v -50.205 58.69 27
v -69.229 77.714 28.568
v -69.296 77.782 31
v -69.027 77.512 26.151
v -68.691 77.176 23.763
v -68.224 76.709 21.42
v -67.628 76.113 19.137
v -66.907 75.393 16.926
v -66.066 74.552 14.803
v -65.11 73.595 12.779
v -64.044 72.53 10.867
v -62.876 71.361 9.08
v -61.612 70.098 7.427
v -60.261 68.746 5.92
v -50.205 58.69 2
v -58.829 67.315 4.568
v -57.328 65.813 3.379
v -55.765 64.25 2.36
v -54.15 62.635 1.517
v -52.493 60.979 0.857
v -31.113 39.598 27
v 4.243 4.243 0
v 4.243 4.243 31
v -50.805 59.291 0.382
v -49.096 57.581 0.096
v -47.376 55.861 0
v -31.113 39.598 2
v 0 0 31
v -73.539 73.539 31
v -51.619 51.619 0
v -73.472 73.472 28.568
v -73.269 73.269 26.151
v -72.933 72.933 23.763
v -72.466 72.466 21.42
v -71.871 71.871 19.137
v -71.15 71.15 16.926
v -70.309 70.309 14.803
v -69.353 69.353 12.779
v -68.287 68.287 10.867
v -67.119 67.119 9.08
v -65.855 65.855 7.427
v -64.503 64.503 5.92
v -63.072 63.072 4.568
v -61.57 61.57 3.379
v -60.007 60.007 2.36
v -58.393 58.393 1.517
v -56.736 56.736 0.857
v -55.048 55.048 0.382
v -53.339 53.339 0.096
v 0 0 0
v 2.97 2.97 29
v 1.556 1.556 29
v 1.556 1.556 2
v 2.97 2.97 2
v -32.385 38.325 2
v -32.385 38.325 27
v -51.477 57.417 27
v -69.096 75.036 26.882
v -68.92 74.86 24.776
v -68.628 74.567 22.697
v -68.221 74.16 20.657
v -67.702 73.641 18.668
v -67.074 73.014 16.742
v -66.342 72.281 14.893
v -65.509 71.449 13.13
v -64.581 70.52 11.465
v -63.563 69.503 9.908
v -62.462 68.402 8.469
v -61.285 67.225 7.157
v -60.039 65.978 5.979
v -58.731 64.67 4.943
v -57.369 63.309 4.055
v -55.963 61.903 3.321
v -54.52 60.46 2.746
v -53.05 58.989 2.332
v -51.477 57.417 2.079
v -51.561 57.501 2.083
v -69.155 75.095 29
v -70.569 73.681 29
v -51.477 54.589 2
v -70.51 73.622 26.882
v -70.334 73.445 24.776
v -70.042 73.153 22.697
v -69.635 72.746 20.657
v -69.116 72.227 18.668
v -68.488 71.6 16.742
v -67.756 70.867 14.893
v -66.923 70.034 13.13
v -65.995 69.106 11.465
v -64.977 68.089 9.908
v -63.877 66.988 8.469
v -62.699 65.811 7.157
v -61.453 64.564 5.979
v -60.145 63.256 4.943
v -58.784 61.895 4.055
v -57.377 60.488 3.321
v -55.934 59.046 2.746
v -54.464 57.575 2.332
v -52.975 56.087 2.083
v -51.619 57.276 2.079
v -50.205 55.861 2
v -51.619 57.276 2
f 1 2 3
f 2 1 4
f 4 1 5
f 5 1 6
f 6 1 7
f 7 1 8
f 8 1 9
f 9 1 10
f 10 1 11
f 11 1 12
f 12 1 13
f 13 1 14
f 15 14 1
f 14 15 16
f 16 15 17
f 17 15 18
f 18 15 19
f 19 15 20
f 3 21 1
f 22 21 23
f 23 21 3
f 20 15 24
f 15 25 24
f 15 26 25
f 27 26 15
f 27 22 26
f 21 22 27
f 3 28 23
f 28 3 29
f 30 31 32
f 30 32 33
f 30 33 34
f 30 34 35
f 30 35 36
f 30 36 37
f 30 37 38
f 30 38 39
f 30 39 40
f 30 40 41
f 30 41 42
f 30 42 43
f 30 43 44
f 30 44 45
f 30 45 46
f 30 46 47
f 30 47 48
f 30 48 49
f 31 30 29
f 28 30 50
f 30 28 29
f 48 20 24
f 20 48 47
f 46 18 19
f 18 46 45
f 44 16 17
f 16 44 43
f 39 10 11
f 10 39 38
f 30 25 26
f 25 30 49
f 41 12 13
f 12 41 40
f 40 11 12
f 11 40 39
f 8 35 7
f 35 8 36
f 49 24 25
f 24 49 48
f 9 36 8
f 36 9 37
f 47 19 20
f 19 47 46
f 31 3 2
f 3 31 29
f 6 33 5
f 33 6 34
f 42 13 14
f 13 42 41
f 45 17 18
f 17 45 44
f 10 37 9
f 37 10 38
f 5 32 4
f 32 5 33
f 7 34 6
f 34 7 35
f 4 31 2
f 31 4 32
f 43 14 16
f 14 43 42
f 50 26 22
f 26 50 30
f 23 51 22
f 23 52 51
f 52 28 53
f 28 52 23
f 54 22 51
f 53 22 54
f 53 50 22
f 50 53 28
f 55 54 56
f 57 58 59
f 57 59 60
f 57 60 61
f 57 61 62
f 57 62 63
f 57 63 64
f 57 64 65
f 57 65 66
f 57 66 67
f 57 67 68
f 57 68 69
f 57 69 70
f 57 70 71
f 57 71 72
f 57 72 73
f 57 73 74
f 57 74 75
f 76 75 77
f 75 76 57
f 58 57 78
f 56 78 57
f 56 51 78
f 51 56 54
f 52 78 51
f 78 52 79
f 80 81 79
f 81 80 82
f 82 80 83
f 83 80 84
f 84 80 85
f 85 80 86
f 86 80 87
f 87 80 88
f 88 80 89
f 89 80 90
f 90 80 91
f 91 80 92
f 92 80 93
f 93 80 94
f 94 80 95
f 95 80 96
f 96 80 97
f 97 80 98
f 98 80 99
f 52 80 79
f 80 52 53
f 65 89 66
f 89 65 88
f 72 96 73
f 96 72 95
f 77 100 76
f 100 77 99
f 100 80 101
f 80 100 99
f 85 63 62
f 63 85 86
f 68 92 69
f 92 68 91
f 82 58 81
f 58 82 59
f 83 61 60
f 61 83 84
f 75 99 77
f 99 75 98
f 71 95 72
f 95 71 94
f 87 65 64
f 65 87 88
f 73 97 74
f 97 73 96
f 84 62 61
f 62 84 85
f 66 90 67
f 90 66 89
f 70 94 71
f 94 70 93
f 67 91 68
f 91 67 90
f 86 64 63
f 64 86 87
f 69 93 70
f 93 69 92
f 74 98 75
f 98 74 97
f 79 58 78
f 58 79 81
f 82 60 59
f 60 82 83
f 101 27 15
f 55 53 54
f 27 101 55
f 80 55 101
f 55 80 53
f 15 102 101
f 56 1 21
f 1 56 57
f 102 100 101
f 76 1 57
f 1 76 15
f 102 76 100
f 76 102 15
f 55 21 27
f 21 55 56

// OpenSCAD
// parametric knife sheath

// length: the length of the blade from handle to tip
// maxwidth: the maximum width of the blade
// tipwidth:  the width near the tip, zero means it comes to a point
// thickness: maximum thickness of the blade
// show:  0 = do not put a window to show the blade style
//
// all measurements are in mm

//CUSTOMIZER VARIABLES

//	Knife length, mm
knife_length = 100;	//	[25:350]

//	Knife Max Blade width, mm
knife_width = 25;	//	[10:100]

//	Knife thickness, mm
knife_thickness = 2.0;	//	[1:5]

// Show knife through window?
knife_show = 1; // [0:No, 1:Yes]

//CUSTOMIZER VARIABLES END

$fn = 80*1;  // while debugging reduce this to 20 to save time

wall = 2*1;
pad = 2*1;

rotate([0,0,45])
	parasheath(length=knife_length, maxwidth=knife_width, thickness=knife_thickness, show=knife_show);


module parasheath(length=200, maxwidth=25, thickness=2, show=1) {

	difference() {

		// first make an oversized blade, oversized by 2 times the wall thickness

		blade(len=length+wall+pad,maxwid=maxwidth+pad+2*wall,thick=thickness+2*wall);

		translate([wall+0.2,-0.1,wall]) 
			blade(len=length+0.1+pad, maxwid=maxwidth+pad, thick=thickness);

		if (show) {
			translate([thickness+wall,length-2*maxwidth,wall]) 
			 		cube([100,wall+maxwidth,maxwidth]);
		}
	}

}

module blade(len=200, maxwid=25, tipwid=5, thick=2) {

	union() {
		intersection() {
				// first make a cube
				cube([thick, len, maxwid]);
	
				translate([0,len-maxwid,maxwid]) 
					rotate([0,90,0]) 
						cylinder(r=maxwid,h=thick*3,center=true);
		}

		cube([thick,len-maxwid,maxwid]);
	}
}
